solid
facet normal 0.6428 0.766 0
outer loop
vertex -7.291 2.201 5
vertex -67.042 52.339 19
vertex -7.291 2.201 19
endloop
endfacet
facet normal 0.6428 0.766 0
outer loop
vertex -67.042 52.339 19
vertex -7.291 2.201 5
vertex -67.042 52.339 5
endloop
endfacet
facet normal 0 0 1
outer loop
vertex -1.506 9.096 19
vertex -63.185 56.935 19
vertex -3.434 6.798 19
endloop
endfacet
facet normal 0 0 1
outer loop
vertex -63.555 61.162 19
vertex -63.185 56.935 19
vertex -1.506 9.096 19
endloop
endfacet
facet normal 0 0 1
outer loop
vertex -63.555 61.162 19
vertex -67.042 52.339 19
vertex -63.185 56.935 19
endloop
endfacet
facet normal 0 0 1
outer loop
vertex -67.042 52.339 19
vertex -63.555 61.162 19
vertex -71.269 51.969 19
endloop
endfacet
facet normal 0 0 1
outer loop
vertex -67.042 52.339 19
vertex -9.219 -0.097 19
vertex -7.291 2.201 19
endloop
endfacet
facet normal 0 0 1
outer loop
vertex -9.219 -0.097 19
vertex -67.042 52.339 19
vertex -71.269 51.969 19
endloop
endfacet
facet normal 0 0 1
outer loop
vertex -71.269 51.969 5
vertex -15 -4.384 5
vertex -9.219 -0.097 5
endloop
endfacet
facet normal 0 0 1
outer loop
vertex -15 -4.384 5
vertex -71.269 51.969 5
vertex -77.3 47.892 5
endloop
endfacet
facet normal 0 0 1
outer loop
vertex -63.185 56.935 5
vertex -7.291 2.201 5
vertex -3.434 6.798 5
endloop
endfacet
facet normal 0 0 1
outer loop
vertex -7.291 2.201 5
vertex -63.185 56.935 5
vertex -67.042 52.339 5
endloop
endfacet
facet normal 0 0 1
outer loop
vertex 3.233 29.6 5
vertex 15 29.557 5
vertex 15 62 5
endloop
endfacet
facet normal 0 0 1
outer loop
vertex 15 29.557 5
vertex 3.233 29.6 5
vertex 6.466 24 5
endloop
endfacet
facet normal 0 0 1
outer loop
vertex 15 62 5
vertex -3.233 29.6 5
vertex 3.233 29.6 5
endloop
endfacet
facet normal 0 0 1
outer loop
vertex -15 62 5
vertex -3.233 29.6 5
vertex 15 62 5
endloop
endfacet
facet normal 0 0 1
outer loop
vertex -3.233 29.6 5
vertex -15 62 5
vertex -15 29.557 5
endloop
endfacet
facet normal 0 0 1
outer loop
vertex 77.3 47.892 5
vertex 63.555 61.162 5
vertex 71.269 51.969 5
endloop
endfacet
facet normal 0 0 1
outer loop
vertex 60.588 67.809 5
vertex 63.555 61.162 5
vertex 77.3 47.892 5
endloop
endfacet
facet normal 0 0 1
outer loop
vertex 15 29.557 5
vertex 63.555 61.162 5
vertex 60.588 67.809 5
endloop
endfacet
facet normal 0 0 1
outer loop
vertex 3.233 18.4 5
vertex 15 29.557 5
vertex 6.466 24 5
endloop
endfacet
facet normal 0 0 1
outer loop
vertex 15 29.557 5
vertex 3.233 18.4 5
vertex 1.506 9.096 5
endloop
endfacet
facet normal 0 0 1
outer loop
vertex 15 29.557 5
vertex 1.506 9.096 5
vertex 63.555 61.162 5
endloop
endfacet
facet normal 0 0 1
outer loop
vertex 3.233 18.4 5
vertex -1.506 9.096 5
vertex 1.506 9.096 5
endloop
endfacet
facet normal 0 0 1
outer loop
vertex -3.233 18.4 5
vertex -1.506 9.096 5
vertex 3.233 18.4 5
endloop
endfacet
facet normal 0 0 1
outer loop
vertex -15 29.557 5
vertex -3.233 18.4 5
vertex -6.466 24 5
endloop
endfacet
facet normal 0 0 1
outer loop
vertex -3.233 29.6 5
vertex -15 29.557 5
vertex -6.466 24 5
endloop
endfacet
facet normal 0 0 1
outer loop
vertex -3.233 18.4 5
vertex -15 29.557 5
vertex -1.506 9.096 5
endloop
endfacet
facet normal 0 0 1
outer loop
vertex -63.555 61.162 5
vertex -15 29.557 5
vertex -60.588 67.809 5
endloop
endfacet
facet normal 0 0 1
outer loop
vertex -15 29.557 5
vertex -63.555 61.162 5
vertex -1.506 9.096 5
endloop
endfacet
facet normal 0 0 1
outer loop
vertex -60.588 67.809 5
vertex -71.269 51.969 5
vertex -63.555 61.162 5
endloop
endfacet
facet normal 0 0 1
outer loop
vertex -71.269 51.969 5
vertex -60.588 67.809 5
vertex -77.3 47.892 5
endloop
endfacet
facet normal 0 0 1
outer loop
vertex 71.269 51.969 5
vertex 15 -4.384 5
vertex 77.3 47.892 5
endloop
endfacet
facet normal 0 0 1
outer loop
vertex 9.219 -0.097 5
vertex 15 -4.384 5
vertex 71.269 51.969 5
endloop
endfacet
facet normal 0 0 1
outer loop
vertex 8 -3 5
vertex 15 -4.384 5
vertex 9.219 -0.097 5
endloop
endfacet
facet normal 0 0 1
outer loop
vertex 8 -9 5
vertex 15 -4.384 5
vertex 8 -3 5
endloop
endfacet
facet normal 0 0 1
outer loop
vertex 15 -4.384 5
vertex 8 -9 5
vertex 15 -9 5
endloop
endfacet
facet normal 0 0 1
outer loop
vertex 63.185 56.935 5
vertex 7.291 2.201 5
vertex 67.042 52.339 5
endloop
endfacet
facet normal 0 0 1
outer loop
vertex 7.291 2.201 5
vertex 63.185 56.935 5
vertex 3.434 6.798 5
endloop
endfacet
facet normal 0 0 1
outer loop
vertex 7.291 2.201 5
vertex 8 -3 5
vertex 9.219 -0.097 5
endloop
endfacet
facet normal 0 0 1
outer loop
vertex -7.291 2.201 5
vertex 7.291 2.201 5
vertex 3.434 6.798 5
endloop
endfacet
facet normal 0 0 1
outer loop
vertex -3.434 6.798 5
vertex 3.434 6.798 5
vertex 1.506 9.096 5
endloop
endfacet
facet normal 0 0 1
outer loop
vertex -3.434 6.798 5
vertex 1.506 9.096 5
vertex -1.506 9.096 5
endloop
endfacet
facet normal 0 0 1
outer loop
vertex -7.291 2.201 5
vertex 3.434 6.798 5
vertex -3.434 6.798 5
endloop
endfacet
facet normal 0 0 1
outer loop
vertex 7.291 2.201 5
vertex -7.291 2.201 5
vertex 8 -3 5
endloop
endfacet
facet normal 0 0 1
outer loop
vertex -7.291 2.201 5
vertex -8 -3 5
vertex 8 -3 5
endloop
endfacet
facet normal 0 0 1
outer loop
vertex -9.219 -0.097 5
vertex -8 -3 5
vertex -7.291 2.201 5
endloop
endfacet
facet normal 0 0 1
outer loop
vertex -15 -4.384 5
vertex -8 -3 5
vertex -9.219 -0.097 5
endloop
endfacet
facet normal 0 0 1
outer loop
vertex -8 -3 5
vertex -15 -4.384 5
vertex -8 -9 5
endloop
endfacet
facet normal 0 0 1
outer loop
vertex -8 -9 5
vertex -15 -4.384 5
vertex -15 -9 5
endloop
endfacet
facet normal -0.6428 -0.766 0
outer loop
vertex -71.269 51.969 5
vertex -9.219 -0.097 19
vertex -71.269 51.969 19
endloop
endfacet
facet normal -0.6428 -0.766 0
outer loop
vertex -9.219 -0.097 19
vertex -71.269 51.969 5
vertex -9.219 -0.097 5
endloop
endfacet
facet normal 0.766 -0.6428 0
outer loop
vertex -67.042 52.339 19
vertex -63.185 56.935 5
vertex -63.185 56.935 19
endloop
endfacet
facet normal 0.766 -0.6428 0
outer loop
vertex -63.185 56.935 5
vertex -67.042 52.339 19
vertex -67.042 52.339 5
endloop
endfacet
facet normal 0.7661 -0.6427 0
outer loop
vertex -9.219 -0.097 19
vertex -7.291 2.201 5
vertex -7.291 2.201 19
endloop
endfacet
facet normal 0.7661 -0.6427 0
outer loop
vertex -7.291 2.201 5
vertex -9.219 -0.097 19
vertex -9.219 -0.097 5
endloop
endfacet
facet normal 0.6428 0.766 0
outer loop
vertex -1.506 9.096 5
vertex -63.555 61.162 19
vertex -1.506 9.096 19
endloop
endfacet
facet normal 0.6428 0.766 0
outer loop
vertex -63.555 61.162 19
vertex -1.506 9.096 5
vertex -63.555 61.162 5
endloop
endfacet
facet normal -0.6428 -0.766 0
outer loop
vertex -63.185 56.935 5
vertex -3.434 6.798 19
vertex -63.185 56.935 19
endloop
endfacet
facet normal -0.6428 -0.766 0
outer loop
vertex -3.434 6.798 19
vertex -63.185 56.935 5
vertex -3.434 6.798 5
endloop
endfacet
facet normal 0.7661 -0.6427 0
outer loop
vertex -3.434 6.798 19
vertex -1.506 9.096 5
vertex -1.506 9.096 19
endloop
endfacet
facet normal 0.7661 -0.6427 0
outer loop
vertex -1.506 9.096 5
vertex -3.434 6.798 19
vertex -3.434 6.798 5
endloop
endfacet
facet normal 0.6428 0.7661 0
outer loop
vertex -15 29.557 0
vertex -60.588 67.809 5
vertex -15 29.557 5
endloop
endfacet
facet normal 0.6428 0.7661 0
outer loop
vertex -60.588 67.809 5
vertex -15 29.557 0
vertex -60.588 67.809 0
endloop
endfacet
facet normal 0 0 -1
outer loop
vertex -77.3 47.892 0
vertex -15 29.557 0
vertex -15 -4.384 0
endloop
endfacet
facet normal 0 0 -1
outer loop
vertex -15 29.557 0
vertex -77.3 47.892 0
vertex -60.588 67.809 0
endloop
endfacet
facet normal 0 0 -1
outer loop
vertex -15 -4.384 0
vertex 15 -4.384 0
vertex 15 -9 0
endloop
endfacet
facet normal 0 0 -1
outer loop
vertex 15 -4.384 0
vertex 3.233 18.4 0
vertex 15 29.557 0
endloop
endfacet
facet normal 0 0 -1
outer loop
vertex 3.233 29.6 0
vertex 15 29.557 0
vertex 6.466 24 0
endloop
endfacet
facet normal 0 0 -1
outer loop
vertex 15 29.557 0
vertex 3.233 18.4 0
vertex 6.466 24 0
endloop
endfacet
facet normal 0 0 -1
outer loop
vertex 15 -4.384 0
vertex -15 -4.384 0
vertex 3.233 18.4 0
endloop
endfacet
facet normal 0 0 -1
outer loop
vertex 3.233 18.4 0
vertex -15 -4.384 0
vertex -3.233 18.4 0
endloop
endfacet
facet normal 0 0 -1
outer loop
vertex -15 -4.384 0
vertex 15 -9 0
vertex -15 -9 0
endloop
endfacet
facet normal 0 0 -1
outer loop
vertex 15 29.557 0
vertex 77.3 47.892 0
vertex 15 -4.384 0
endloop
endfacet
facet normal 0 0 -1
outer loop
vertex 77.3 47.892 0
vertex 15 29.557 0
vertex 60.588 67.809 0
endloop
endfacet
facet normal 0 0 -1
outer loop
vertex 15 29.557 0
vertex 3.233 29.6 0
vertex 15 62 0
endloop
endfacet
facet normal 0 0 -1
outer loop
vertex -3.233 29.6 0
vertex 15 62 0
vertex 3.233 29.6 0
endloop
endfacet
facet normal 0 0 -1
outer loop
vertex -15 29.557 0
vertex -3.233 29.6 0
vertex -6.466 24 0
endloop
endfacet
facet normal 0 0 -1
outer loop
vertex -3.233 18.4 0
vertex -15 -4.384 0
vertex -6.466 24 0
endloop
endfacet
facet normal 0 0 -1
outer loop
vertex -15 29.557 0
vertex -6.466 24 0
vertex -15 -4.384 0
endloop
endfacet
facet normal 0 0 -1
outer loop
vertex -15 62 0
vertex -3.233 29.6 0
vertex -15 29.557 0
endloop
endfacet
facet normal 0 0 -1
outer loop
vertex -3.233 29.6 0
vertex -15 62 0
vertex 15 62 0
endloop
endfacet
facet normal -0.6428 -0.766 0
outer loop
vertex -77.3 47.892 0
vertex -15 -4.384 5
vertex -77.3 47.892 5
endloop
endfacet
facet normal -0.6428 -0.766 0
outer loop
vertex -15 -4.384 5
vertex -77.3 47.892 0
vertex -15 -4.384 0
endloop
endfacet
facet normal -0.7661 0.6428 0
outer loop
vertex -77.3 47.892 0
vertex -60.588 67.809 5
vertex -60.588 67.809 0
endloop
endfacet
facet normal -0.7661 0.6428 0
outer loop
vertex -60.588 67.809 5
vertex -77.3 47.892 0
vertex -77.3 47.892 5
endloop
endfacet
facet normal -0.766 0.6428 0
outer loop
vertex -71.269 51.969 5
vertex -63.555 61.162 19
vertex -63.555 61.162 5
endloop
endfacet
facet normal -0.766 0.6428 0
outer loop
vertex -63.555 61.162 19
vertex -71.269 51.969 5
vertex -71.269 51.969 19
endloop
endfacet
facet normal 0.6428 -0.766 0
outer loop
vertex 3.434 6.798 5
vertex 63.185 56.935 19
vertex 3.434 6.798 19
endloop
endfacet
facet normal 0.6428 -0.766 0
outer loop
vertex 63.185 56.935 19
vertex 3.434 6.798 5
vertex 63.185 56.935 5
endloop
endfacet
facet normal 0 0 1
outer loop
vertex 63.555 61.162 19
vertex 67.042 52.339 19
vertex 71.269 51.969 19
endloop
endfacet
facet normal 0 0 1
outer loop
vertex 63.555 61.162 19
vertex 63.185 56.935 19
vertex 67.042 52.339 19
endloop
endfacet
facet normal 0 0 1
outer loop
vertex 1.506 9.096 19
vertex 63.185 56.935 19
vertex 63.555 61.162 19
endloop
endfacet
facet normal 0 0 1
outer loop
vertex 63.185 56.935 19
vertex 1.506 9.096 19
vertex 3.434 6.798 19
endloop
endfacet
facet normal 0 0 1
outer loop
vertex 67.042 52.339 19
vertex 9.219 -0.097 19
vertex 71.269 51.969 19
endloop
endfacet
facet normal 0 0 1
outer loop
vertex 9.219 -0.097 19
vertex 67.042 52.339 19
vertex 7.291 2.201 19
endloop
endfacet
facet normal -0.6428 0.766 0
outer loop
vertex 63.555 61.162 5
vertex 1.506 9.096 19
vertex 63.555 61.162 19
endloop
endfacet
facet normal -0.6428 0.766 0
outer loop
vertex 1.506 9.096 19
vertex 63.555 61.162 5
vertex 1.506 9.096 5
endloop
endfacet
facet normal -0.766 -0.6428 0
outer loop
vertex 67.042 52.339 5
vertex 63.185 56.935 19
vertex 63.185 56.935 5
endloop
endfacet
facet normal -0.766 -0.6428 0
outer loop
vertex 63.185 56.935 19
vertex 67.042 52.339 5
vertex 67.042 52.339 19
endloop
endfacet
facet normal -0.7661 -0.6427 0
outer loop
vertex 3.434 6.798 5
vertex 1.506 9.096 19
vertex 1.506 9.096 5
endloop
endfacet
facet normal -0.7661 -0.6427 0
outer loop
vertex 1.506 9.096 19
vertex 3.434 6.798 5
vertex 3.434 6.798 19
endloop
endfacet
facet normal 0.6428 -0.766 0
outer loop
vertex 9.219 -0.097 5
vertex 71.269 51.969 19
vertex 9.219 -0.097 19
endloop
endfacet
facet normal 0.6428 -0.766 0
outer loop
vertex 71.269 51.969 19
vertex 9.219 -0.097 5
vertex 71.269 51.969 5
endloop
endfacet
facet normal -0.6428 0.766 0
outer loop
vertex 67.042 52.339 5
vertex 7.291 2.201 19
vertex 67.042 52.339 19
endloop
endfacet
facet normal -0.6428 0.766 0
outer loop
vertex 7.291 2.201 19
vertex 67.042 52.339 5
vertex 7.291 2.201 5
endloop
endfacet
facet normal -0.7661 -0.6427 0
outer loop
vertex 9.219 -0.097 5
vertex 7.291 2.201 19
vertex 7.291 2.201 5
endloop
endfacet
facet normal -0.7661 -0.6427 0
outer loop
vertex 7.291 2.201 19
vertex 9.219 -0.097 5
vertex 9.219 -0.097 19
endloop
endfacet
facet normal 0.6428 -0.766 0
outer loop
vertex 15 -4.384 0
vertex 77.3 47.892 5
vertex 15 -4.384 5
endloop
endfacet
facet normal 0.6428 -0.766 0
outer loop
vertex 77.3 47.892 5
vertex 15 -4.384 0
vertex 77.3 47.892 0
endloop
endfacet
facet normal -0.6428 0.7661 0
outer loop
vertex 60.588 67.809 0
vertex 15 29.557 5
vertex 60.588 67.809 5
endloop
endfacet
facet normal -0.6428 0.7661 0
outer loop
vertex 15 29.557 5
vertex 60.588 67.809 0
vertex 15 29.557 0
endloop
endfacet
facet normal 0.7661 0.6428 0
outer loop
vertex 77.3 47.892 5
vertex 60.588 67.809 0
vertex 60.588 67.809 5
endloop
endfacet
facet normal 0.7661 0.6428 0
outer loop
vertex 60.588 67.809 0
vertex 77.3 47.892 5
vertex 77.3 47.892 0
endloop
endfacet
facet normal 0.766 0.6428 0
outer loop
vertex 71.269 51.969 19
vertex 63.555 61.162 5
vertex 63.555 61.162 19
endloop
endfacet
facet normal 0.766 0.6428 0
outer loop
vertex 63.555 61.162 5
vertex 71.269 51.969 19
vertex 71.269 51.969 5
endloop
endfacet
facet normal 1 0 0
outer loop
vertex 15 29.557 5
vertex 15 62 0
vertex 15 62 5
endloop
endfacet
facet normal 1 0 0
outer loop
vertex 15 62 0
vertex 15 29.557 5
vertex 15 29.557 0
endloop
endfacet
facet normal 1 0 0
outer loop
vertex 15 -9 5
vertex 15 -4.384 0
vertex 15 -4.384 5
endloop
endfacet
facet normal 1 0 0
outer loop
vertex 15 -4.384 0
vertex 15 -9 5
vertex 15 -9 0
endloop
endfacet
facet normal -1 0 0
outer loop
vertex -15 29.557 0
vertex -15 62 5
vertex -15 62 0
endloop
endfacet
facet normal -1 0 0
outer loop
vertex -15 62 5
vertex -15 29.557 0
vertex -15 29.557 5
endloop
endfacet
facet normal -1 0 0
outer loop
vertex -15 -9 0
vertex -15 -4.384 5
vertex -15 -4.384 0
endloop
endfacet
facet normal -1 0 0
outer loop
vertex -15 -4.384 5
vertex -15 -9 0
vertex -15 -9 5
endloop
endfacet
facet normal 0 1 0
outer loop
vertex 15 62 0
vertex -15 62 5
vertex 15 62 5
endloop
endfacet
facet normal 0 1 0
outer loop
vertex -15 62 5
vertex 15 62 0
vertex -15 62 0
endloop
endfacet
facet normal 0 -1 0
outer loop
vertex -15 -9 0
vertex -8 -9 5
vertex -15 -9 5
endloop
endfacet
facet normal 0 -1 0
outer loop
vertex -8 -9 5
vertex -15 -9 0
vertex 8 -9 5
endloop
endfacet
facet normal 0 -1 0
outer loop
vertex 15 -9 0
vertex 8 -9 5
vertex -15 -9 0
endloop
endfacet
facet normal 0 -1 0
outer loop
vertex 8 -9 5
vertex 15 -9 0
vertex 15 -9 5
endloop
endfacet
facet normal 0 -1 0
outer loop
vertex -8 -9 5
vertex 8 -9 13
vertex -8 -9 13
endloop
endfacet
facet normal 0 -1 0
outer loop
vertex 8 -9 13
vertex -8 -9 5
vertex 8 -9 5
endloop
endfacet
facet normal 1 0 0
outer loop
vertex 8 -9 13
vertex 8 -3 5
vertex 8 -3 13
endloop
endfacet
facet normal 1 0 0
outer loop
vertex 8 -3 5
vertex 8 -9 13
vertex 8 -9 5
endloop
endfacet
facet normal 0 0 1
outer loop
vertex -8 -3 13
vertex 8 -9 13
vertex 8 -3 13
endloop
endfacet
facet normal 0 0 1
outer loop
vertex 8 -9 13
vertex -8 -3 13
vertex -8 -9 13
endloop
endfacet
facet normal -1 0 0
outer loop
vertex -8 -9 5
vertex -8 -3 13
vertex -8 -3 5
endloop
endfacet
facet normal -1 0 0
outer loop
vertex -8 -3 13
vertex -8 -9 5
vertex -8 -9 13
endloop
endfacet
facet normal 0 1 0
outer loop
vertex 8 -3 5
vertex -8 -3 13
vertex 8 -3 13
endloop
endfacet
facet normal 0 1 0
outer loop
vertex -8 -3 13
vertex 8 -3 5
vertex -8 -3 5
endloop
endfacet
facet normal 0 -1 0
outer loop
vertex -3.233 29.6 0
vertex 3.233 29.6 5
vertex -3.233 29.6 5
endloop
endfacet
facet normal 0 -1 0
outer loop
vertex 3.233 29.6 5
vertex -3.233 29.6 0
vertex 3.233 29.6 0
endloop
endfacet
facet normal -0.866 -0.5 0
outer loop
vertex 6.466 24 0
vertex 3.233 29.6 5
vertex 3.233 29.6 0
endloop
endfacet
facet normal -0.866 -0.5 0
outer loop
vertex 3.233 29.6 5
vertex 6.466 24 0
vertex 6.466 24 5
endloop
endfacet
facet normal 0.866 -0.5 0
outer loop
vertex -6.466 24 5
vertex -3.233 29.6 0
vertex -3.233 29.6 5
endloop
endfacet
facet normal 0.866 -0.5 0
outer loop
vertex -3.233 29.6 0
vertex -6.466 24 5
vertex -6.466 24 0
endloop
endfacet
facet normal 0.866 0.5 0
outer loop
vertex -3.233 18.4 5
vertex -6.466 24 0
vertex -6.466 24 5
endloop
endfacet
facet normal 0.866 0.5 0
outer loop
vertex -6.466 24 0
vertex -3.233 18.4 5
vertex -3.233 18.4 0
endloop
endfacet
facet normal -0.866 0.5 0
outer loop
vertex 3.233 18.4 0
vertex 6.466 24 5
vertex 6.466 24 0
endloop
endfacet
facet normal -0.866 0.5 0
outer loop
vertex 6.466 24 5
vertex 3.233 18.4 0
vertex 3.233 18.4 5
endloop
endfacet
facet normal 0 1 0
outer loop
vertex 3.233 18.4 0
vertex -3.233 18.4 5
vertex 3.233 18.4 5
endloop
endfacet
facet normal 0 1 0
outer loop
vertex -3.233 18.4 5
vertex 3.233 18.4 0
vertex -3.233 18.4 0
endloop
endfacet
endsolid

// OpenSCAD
// 아이폰 듀오 삼각대 받침 — OpenSCAD 원본. 치수는 mm.
slot=6.0; wall=3.0; wallH=14.0; plate=5.0; half=82.3; long=117.8;
nut_af=11.2; nut_h=5.6; bolt=6.6;   // 1/4-20 육각너트 포켓

module v_cradle(theta=100) {
  r0=7; arm=78; hole_y=24;
  difference() {
    union() {
      for (sg=[-1,1]) rotate([0,0,-sg*theta/2]) {
        translate([-(slot+2*wall+14)/2, r0-5, 0]) cube([slot+2*wall+14, arm+10, plate]);
        for (s=[-1,1]) translate([s*(slot/2+wall/2)-wall/2, r0, plate]) cube([wall, arm, wallH]);
        translate([-(slot/2+wall), r0+arm, plate]) cube([slot+2*wall, 3, wallH]);
      }
      translate([-15, -9, 0]) cube([30, 2*hole_y+14+9, plate]);
      translate([-8, -9, 0]) cube([16, 6, plate+8]);
    }
    translate([0, hole_y, -1]) cylinder(d=bolt, h=plate+2, $fn=32);
    translate([0, hole_y, plate-nut_h]) cylinder(d=nut_af/cos(30), h=nut_h+1, $fn=6);
  }
}
module tent_cradle(theta=130) {
  d = 2*half*sin(theta/2); len=long+6;
  difference() {
    union() {
      translate([-len/2, -(d/2+slot+2*wall+5), 0]) cube([len, d+2*(slot+2*wall)+10, plate]);
      for (sg=[-1,1]) translate([0, sg*d/2, plate]) rotate([-sg*theta/2, 0, 0])
        for (s=[-1,1]) translate([-len/2, s*(slot/2+wall/2)-wall/2, -1]) cube([len, wall, wallH]);
    }
    translate([0,0,-1]) cylinder(d=bolt, h=plate+2, $fn=32);
    translate([0,0,plate-nut_h]) cylinder(d=nut_af/cos(30), h=nut_h+1, $fn=6);
  }
}
// 쓸 것 하나만 남길 것:
v_cradle(100);
// translate([0,150,0]) tent_cradle(130);
